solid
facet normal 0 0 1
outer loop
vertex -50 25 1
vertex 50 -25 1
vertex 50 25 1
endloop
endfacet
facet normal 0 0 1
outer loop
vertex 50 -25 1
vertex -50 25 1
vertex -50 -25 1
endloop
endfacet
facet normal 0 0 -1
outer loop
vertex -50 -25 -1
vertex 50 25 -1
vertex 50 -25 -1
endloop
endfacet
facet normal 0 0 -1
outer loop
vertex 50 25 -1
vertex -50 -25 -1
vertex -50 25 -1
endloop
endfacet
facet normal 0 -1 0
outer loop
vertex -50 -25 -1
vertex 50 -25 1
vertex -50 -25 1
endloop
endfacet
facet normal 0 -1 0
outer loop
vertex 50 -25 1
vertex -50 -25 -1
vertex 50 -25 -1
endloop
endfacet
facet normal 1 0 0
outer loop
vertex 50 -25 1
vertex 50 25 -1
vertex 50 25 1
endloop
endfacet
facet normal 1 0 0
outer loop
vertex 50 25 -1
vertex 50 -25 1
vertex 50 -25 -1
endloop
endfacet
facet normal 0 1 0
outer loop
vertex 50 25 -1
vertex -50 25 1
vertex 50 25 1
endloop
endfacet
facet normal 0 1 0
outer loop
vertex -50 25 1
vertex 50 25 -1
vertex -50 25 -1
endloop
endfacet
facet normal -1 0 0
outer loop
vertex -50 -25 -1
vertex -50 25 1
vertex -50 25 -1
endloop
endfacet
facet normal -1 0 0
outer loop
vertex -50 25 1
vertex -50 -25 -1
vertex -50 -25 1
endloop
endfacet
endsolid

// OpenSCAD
// Parameters
sheet_length = 100;
sheet_width  = 50;
sheet_thickness = 2;

$fn = 64;

// Ensure non-zero, visible geometry
L = max(sheet_length, 0.01);
W = max(sheet_width,  0.01);
T = max(sheet_thickness, 0.01);

// One connected solid: a simple rectangular sheet
cube([L, W, T], center=true);
